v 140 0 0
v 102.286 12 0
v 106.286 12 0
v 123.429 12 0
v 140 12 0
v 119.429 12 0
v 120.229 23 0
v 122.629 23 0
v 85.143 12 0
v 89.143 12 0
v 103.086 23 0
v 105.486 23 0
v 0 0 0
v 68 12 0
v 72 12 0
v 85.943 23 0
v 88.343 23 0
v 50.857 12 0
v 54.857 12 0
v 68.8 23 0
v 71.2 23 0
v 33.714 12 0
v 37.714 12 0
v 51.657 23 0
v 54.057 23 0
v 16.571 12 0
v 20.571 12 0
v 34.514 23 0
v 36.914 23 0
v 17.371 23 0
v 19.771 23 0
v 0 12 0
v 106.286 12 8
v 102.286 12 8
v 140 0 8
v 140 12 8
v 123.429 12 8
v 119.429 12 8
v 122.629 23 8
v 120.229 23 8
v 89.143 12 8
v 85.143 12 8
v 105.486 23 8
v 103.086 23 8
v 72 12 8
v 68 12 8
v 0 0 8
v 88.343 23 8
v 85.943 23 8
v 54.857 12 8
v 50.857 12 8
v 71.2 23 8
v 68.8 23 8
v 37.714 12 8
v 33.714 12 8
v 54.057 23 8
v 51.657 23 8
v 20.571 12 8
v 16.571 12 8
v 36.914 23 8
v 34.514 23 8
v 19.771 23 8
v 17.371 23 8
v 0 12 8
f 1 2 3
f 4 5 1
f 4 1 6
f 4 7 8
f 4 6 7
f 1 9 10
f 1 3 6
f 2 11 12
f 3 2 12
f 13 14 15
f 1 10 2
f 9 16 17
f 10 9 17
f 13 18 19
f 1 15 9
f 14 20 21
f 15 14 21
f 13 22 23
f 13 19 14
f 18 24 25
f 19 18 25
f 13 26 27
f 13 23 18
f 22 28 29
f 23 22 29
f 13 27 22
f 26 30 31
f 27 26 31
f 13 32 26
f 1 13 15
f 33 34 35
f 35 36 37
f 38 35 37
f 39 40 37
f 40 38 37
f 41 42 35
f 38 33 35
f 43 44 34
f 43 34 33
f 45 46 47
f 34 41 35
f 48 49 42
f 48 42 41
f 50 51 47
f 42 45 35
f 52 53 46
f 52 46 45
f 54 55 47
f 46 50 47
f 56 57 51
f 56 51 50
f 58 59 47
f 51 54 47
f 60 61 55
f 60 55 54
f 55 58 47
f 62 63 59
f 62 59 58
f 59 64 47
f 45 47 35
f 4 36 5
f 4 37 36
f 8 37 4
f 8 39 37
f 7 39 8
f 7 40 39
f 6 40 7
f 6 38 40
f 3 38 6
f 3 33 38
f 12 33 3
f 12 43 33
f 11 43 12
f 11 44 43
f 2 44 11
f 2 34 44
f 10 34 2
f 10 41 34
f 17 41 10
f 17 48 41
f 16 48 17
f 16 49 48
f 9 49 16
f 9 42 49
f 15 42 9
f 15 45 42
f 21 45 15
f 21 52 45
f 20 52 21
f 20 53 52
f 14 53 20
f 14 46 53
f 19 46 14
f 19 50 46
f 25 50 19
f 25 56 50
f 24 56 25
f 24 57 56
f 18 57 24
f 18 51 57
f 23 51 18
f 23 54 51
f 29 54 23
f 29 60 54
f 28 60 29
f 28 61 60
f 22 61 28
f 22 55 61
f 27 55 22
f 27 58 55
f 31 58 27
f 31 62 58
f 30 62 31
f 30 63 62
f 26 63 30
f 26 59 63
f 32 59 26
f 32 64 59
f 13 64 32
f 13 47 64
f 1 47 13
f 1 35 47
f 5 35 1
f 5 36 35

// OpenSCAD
$fn = 32;

// ----------------------------------------------------------------------
// Gear rack: 7 teeth on a 140 mm bar, pitch 17.14 mm
// ----------------------------------------------------------------------

// --- parameters (mm) ---
profile_height = 8;       // extrusion height
profile_points = 32;      // points of the closed outline

profile = [[0, 0], [140, 0], [140, 12], [123.429, 12], [122.629, 23], [120.229, 23], [119.429, 12], [106.286, 12], [105.486, 23], [103.086, 23], [102.286, 12], [89.143, 12], [88.343, 23], [85.943, 23], [85.143, 12], [72, 12], [71.2, 23], [68.8, 23], [68, 12], [54.857, 12], [54.057, 23], [51.657, 23], [50.857, 12], [37.714, 12], [36.914, 23], [34.514, 23], [33.714, 12], [20.571, 12], [19.771, 23], [17.371, 23], [16.571, 12], [0, 12]];  // single closed polygon, 32 points, counter clockwise

// --- the one profile operation ---
linear_extrude(height = profile_height) polygon(points = profile);
